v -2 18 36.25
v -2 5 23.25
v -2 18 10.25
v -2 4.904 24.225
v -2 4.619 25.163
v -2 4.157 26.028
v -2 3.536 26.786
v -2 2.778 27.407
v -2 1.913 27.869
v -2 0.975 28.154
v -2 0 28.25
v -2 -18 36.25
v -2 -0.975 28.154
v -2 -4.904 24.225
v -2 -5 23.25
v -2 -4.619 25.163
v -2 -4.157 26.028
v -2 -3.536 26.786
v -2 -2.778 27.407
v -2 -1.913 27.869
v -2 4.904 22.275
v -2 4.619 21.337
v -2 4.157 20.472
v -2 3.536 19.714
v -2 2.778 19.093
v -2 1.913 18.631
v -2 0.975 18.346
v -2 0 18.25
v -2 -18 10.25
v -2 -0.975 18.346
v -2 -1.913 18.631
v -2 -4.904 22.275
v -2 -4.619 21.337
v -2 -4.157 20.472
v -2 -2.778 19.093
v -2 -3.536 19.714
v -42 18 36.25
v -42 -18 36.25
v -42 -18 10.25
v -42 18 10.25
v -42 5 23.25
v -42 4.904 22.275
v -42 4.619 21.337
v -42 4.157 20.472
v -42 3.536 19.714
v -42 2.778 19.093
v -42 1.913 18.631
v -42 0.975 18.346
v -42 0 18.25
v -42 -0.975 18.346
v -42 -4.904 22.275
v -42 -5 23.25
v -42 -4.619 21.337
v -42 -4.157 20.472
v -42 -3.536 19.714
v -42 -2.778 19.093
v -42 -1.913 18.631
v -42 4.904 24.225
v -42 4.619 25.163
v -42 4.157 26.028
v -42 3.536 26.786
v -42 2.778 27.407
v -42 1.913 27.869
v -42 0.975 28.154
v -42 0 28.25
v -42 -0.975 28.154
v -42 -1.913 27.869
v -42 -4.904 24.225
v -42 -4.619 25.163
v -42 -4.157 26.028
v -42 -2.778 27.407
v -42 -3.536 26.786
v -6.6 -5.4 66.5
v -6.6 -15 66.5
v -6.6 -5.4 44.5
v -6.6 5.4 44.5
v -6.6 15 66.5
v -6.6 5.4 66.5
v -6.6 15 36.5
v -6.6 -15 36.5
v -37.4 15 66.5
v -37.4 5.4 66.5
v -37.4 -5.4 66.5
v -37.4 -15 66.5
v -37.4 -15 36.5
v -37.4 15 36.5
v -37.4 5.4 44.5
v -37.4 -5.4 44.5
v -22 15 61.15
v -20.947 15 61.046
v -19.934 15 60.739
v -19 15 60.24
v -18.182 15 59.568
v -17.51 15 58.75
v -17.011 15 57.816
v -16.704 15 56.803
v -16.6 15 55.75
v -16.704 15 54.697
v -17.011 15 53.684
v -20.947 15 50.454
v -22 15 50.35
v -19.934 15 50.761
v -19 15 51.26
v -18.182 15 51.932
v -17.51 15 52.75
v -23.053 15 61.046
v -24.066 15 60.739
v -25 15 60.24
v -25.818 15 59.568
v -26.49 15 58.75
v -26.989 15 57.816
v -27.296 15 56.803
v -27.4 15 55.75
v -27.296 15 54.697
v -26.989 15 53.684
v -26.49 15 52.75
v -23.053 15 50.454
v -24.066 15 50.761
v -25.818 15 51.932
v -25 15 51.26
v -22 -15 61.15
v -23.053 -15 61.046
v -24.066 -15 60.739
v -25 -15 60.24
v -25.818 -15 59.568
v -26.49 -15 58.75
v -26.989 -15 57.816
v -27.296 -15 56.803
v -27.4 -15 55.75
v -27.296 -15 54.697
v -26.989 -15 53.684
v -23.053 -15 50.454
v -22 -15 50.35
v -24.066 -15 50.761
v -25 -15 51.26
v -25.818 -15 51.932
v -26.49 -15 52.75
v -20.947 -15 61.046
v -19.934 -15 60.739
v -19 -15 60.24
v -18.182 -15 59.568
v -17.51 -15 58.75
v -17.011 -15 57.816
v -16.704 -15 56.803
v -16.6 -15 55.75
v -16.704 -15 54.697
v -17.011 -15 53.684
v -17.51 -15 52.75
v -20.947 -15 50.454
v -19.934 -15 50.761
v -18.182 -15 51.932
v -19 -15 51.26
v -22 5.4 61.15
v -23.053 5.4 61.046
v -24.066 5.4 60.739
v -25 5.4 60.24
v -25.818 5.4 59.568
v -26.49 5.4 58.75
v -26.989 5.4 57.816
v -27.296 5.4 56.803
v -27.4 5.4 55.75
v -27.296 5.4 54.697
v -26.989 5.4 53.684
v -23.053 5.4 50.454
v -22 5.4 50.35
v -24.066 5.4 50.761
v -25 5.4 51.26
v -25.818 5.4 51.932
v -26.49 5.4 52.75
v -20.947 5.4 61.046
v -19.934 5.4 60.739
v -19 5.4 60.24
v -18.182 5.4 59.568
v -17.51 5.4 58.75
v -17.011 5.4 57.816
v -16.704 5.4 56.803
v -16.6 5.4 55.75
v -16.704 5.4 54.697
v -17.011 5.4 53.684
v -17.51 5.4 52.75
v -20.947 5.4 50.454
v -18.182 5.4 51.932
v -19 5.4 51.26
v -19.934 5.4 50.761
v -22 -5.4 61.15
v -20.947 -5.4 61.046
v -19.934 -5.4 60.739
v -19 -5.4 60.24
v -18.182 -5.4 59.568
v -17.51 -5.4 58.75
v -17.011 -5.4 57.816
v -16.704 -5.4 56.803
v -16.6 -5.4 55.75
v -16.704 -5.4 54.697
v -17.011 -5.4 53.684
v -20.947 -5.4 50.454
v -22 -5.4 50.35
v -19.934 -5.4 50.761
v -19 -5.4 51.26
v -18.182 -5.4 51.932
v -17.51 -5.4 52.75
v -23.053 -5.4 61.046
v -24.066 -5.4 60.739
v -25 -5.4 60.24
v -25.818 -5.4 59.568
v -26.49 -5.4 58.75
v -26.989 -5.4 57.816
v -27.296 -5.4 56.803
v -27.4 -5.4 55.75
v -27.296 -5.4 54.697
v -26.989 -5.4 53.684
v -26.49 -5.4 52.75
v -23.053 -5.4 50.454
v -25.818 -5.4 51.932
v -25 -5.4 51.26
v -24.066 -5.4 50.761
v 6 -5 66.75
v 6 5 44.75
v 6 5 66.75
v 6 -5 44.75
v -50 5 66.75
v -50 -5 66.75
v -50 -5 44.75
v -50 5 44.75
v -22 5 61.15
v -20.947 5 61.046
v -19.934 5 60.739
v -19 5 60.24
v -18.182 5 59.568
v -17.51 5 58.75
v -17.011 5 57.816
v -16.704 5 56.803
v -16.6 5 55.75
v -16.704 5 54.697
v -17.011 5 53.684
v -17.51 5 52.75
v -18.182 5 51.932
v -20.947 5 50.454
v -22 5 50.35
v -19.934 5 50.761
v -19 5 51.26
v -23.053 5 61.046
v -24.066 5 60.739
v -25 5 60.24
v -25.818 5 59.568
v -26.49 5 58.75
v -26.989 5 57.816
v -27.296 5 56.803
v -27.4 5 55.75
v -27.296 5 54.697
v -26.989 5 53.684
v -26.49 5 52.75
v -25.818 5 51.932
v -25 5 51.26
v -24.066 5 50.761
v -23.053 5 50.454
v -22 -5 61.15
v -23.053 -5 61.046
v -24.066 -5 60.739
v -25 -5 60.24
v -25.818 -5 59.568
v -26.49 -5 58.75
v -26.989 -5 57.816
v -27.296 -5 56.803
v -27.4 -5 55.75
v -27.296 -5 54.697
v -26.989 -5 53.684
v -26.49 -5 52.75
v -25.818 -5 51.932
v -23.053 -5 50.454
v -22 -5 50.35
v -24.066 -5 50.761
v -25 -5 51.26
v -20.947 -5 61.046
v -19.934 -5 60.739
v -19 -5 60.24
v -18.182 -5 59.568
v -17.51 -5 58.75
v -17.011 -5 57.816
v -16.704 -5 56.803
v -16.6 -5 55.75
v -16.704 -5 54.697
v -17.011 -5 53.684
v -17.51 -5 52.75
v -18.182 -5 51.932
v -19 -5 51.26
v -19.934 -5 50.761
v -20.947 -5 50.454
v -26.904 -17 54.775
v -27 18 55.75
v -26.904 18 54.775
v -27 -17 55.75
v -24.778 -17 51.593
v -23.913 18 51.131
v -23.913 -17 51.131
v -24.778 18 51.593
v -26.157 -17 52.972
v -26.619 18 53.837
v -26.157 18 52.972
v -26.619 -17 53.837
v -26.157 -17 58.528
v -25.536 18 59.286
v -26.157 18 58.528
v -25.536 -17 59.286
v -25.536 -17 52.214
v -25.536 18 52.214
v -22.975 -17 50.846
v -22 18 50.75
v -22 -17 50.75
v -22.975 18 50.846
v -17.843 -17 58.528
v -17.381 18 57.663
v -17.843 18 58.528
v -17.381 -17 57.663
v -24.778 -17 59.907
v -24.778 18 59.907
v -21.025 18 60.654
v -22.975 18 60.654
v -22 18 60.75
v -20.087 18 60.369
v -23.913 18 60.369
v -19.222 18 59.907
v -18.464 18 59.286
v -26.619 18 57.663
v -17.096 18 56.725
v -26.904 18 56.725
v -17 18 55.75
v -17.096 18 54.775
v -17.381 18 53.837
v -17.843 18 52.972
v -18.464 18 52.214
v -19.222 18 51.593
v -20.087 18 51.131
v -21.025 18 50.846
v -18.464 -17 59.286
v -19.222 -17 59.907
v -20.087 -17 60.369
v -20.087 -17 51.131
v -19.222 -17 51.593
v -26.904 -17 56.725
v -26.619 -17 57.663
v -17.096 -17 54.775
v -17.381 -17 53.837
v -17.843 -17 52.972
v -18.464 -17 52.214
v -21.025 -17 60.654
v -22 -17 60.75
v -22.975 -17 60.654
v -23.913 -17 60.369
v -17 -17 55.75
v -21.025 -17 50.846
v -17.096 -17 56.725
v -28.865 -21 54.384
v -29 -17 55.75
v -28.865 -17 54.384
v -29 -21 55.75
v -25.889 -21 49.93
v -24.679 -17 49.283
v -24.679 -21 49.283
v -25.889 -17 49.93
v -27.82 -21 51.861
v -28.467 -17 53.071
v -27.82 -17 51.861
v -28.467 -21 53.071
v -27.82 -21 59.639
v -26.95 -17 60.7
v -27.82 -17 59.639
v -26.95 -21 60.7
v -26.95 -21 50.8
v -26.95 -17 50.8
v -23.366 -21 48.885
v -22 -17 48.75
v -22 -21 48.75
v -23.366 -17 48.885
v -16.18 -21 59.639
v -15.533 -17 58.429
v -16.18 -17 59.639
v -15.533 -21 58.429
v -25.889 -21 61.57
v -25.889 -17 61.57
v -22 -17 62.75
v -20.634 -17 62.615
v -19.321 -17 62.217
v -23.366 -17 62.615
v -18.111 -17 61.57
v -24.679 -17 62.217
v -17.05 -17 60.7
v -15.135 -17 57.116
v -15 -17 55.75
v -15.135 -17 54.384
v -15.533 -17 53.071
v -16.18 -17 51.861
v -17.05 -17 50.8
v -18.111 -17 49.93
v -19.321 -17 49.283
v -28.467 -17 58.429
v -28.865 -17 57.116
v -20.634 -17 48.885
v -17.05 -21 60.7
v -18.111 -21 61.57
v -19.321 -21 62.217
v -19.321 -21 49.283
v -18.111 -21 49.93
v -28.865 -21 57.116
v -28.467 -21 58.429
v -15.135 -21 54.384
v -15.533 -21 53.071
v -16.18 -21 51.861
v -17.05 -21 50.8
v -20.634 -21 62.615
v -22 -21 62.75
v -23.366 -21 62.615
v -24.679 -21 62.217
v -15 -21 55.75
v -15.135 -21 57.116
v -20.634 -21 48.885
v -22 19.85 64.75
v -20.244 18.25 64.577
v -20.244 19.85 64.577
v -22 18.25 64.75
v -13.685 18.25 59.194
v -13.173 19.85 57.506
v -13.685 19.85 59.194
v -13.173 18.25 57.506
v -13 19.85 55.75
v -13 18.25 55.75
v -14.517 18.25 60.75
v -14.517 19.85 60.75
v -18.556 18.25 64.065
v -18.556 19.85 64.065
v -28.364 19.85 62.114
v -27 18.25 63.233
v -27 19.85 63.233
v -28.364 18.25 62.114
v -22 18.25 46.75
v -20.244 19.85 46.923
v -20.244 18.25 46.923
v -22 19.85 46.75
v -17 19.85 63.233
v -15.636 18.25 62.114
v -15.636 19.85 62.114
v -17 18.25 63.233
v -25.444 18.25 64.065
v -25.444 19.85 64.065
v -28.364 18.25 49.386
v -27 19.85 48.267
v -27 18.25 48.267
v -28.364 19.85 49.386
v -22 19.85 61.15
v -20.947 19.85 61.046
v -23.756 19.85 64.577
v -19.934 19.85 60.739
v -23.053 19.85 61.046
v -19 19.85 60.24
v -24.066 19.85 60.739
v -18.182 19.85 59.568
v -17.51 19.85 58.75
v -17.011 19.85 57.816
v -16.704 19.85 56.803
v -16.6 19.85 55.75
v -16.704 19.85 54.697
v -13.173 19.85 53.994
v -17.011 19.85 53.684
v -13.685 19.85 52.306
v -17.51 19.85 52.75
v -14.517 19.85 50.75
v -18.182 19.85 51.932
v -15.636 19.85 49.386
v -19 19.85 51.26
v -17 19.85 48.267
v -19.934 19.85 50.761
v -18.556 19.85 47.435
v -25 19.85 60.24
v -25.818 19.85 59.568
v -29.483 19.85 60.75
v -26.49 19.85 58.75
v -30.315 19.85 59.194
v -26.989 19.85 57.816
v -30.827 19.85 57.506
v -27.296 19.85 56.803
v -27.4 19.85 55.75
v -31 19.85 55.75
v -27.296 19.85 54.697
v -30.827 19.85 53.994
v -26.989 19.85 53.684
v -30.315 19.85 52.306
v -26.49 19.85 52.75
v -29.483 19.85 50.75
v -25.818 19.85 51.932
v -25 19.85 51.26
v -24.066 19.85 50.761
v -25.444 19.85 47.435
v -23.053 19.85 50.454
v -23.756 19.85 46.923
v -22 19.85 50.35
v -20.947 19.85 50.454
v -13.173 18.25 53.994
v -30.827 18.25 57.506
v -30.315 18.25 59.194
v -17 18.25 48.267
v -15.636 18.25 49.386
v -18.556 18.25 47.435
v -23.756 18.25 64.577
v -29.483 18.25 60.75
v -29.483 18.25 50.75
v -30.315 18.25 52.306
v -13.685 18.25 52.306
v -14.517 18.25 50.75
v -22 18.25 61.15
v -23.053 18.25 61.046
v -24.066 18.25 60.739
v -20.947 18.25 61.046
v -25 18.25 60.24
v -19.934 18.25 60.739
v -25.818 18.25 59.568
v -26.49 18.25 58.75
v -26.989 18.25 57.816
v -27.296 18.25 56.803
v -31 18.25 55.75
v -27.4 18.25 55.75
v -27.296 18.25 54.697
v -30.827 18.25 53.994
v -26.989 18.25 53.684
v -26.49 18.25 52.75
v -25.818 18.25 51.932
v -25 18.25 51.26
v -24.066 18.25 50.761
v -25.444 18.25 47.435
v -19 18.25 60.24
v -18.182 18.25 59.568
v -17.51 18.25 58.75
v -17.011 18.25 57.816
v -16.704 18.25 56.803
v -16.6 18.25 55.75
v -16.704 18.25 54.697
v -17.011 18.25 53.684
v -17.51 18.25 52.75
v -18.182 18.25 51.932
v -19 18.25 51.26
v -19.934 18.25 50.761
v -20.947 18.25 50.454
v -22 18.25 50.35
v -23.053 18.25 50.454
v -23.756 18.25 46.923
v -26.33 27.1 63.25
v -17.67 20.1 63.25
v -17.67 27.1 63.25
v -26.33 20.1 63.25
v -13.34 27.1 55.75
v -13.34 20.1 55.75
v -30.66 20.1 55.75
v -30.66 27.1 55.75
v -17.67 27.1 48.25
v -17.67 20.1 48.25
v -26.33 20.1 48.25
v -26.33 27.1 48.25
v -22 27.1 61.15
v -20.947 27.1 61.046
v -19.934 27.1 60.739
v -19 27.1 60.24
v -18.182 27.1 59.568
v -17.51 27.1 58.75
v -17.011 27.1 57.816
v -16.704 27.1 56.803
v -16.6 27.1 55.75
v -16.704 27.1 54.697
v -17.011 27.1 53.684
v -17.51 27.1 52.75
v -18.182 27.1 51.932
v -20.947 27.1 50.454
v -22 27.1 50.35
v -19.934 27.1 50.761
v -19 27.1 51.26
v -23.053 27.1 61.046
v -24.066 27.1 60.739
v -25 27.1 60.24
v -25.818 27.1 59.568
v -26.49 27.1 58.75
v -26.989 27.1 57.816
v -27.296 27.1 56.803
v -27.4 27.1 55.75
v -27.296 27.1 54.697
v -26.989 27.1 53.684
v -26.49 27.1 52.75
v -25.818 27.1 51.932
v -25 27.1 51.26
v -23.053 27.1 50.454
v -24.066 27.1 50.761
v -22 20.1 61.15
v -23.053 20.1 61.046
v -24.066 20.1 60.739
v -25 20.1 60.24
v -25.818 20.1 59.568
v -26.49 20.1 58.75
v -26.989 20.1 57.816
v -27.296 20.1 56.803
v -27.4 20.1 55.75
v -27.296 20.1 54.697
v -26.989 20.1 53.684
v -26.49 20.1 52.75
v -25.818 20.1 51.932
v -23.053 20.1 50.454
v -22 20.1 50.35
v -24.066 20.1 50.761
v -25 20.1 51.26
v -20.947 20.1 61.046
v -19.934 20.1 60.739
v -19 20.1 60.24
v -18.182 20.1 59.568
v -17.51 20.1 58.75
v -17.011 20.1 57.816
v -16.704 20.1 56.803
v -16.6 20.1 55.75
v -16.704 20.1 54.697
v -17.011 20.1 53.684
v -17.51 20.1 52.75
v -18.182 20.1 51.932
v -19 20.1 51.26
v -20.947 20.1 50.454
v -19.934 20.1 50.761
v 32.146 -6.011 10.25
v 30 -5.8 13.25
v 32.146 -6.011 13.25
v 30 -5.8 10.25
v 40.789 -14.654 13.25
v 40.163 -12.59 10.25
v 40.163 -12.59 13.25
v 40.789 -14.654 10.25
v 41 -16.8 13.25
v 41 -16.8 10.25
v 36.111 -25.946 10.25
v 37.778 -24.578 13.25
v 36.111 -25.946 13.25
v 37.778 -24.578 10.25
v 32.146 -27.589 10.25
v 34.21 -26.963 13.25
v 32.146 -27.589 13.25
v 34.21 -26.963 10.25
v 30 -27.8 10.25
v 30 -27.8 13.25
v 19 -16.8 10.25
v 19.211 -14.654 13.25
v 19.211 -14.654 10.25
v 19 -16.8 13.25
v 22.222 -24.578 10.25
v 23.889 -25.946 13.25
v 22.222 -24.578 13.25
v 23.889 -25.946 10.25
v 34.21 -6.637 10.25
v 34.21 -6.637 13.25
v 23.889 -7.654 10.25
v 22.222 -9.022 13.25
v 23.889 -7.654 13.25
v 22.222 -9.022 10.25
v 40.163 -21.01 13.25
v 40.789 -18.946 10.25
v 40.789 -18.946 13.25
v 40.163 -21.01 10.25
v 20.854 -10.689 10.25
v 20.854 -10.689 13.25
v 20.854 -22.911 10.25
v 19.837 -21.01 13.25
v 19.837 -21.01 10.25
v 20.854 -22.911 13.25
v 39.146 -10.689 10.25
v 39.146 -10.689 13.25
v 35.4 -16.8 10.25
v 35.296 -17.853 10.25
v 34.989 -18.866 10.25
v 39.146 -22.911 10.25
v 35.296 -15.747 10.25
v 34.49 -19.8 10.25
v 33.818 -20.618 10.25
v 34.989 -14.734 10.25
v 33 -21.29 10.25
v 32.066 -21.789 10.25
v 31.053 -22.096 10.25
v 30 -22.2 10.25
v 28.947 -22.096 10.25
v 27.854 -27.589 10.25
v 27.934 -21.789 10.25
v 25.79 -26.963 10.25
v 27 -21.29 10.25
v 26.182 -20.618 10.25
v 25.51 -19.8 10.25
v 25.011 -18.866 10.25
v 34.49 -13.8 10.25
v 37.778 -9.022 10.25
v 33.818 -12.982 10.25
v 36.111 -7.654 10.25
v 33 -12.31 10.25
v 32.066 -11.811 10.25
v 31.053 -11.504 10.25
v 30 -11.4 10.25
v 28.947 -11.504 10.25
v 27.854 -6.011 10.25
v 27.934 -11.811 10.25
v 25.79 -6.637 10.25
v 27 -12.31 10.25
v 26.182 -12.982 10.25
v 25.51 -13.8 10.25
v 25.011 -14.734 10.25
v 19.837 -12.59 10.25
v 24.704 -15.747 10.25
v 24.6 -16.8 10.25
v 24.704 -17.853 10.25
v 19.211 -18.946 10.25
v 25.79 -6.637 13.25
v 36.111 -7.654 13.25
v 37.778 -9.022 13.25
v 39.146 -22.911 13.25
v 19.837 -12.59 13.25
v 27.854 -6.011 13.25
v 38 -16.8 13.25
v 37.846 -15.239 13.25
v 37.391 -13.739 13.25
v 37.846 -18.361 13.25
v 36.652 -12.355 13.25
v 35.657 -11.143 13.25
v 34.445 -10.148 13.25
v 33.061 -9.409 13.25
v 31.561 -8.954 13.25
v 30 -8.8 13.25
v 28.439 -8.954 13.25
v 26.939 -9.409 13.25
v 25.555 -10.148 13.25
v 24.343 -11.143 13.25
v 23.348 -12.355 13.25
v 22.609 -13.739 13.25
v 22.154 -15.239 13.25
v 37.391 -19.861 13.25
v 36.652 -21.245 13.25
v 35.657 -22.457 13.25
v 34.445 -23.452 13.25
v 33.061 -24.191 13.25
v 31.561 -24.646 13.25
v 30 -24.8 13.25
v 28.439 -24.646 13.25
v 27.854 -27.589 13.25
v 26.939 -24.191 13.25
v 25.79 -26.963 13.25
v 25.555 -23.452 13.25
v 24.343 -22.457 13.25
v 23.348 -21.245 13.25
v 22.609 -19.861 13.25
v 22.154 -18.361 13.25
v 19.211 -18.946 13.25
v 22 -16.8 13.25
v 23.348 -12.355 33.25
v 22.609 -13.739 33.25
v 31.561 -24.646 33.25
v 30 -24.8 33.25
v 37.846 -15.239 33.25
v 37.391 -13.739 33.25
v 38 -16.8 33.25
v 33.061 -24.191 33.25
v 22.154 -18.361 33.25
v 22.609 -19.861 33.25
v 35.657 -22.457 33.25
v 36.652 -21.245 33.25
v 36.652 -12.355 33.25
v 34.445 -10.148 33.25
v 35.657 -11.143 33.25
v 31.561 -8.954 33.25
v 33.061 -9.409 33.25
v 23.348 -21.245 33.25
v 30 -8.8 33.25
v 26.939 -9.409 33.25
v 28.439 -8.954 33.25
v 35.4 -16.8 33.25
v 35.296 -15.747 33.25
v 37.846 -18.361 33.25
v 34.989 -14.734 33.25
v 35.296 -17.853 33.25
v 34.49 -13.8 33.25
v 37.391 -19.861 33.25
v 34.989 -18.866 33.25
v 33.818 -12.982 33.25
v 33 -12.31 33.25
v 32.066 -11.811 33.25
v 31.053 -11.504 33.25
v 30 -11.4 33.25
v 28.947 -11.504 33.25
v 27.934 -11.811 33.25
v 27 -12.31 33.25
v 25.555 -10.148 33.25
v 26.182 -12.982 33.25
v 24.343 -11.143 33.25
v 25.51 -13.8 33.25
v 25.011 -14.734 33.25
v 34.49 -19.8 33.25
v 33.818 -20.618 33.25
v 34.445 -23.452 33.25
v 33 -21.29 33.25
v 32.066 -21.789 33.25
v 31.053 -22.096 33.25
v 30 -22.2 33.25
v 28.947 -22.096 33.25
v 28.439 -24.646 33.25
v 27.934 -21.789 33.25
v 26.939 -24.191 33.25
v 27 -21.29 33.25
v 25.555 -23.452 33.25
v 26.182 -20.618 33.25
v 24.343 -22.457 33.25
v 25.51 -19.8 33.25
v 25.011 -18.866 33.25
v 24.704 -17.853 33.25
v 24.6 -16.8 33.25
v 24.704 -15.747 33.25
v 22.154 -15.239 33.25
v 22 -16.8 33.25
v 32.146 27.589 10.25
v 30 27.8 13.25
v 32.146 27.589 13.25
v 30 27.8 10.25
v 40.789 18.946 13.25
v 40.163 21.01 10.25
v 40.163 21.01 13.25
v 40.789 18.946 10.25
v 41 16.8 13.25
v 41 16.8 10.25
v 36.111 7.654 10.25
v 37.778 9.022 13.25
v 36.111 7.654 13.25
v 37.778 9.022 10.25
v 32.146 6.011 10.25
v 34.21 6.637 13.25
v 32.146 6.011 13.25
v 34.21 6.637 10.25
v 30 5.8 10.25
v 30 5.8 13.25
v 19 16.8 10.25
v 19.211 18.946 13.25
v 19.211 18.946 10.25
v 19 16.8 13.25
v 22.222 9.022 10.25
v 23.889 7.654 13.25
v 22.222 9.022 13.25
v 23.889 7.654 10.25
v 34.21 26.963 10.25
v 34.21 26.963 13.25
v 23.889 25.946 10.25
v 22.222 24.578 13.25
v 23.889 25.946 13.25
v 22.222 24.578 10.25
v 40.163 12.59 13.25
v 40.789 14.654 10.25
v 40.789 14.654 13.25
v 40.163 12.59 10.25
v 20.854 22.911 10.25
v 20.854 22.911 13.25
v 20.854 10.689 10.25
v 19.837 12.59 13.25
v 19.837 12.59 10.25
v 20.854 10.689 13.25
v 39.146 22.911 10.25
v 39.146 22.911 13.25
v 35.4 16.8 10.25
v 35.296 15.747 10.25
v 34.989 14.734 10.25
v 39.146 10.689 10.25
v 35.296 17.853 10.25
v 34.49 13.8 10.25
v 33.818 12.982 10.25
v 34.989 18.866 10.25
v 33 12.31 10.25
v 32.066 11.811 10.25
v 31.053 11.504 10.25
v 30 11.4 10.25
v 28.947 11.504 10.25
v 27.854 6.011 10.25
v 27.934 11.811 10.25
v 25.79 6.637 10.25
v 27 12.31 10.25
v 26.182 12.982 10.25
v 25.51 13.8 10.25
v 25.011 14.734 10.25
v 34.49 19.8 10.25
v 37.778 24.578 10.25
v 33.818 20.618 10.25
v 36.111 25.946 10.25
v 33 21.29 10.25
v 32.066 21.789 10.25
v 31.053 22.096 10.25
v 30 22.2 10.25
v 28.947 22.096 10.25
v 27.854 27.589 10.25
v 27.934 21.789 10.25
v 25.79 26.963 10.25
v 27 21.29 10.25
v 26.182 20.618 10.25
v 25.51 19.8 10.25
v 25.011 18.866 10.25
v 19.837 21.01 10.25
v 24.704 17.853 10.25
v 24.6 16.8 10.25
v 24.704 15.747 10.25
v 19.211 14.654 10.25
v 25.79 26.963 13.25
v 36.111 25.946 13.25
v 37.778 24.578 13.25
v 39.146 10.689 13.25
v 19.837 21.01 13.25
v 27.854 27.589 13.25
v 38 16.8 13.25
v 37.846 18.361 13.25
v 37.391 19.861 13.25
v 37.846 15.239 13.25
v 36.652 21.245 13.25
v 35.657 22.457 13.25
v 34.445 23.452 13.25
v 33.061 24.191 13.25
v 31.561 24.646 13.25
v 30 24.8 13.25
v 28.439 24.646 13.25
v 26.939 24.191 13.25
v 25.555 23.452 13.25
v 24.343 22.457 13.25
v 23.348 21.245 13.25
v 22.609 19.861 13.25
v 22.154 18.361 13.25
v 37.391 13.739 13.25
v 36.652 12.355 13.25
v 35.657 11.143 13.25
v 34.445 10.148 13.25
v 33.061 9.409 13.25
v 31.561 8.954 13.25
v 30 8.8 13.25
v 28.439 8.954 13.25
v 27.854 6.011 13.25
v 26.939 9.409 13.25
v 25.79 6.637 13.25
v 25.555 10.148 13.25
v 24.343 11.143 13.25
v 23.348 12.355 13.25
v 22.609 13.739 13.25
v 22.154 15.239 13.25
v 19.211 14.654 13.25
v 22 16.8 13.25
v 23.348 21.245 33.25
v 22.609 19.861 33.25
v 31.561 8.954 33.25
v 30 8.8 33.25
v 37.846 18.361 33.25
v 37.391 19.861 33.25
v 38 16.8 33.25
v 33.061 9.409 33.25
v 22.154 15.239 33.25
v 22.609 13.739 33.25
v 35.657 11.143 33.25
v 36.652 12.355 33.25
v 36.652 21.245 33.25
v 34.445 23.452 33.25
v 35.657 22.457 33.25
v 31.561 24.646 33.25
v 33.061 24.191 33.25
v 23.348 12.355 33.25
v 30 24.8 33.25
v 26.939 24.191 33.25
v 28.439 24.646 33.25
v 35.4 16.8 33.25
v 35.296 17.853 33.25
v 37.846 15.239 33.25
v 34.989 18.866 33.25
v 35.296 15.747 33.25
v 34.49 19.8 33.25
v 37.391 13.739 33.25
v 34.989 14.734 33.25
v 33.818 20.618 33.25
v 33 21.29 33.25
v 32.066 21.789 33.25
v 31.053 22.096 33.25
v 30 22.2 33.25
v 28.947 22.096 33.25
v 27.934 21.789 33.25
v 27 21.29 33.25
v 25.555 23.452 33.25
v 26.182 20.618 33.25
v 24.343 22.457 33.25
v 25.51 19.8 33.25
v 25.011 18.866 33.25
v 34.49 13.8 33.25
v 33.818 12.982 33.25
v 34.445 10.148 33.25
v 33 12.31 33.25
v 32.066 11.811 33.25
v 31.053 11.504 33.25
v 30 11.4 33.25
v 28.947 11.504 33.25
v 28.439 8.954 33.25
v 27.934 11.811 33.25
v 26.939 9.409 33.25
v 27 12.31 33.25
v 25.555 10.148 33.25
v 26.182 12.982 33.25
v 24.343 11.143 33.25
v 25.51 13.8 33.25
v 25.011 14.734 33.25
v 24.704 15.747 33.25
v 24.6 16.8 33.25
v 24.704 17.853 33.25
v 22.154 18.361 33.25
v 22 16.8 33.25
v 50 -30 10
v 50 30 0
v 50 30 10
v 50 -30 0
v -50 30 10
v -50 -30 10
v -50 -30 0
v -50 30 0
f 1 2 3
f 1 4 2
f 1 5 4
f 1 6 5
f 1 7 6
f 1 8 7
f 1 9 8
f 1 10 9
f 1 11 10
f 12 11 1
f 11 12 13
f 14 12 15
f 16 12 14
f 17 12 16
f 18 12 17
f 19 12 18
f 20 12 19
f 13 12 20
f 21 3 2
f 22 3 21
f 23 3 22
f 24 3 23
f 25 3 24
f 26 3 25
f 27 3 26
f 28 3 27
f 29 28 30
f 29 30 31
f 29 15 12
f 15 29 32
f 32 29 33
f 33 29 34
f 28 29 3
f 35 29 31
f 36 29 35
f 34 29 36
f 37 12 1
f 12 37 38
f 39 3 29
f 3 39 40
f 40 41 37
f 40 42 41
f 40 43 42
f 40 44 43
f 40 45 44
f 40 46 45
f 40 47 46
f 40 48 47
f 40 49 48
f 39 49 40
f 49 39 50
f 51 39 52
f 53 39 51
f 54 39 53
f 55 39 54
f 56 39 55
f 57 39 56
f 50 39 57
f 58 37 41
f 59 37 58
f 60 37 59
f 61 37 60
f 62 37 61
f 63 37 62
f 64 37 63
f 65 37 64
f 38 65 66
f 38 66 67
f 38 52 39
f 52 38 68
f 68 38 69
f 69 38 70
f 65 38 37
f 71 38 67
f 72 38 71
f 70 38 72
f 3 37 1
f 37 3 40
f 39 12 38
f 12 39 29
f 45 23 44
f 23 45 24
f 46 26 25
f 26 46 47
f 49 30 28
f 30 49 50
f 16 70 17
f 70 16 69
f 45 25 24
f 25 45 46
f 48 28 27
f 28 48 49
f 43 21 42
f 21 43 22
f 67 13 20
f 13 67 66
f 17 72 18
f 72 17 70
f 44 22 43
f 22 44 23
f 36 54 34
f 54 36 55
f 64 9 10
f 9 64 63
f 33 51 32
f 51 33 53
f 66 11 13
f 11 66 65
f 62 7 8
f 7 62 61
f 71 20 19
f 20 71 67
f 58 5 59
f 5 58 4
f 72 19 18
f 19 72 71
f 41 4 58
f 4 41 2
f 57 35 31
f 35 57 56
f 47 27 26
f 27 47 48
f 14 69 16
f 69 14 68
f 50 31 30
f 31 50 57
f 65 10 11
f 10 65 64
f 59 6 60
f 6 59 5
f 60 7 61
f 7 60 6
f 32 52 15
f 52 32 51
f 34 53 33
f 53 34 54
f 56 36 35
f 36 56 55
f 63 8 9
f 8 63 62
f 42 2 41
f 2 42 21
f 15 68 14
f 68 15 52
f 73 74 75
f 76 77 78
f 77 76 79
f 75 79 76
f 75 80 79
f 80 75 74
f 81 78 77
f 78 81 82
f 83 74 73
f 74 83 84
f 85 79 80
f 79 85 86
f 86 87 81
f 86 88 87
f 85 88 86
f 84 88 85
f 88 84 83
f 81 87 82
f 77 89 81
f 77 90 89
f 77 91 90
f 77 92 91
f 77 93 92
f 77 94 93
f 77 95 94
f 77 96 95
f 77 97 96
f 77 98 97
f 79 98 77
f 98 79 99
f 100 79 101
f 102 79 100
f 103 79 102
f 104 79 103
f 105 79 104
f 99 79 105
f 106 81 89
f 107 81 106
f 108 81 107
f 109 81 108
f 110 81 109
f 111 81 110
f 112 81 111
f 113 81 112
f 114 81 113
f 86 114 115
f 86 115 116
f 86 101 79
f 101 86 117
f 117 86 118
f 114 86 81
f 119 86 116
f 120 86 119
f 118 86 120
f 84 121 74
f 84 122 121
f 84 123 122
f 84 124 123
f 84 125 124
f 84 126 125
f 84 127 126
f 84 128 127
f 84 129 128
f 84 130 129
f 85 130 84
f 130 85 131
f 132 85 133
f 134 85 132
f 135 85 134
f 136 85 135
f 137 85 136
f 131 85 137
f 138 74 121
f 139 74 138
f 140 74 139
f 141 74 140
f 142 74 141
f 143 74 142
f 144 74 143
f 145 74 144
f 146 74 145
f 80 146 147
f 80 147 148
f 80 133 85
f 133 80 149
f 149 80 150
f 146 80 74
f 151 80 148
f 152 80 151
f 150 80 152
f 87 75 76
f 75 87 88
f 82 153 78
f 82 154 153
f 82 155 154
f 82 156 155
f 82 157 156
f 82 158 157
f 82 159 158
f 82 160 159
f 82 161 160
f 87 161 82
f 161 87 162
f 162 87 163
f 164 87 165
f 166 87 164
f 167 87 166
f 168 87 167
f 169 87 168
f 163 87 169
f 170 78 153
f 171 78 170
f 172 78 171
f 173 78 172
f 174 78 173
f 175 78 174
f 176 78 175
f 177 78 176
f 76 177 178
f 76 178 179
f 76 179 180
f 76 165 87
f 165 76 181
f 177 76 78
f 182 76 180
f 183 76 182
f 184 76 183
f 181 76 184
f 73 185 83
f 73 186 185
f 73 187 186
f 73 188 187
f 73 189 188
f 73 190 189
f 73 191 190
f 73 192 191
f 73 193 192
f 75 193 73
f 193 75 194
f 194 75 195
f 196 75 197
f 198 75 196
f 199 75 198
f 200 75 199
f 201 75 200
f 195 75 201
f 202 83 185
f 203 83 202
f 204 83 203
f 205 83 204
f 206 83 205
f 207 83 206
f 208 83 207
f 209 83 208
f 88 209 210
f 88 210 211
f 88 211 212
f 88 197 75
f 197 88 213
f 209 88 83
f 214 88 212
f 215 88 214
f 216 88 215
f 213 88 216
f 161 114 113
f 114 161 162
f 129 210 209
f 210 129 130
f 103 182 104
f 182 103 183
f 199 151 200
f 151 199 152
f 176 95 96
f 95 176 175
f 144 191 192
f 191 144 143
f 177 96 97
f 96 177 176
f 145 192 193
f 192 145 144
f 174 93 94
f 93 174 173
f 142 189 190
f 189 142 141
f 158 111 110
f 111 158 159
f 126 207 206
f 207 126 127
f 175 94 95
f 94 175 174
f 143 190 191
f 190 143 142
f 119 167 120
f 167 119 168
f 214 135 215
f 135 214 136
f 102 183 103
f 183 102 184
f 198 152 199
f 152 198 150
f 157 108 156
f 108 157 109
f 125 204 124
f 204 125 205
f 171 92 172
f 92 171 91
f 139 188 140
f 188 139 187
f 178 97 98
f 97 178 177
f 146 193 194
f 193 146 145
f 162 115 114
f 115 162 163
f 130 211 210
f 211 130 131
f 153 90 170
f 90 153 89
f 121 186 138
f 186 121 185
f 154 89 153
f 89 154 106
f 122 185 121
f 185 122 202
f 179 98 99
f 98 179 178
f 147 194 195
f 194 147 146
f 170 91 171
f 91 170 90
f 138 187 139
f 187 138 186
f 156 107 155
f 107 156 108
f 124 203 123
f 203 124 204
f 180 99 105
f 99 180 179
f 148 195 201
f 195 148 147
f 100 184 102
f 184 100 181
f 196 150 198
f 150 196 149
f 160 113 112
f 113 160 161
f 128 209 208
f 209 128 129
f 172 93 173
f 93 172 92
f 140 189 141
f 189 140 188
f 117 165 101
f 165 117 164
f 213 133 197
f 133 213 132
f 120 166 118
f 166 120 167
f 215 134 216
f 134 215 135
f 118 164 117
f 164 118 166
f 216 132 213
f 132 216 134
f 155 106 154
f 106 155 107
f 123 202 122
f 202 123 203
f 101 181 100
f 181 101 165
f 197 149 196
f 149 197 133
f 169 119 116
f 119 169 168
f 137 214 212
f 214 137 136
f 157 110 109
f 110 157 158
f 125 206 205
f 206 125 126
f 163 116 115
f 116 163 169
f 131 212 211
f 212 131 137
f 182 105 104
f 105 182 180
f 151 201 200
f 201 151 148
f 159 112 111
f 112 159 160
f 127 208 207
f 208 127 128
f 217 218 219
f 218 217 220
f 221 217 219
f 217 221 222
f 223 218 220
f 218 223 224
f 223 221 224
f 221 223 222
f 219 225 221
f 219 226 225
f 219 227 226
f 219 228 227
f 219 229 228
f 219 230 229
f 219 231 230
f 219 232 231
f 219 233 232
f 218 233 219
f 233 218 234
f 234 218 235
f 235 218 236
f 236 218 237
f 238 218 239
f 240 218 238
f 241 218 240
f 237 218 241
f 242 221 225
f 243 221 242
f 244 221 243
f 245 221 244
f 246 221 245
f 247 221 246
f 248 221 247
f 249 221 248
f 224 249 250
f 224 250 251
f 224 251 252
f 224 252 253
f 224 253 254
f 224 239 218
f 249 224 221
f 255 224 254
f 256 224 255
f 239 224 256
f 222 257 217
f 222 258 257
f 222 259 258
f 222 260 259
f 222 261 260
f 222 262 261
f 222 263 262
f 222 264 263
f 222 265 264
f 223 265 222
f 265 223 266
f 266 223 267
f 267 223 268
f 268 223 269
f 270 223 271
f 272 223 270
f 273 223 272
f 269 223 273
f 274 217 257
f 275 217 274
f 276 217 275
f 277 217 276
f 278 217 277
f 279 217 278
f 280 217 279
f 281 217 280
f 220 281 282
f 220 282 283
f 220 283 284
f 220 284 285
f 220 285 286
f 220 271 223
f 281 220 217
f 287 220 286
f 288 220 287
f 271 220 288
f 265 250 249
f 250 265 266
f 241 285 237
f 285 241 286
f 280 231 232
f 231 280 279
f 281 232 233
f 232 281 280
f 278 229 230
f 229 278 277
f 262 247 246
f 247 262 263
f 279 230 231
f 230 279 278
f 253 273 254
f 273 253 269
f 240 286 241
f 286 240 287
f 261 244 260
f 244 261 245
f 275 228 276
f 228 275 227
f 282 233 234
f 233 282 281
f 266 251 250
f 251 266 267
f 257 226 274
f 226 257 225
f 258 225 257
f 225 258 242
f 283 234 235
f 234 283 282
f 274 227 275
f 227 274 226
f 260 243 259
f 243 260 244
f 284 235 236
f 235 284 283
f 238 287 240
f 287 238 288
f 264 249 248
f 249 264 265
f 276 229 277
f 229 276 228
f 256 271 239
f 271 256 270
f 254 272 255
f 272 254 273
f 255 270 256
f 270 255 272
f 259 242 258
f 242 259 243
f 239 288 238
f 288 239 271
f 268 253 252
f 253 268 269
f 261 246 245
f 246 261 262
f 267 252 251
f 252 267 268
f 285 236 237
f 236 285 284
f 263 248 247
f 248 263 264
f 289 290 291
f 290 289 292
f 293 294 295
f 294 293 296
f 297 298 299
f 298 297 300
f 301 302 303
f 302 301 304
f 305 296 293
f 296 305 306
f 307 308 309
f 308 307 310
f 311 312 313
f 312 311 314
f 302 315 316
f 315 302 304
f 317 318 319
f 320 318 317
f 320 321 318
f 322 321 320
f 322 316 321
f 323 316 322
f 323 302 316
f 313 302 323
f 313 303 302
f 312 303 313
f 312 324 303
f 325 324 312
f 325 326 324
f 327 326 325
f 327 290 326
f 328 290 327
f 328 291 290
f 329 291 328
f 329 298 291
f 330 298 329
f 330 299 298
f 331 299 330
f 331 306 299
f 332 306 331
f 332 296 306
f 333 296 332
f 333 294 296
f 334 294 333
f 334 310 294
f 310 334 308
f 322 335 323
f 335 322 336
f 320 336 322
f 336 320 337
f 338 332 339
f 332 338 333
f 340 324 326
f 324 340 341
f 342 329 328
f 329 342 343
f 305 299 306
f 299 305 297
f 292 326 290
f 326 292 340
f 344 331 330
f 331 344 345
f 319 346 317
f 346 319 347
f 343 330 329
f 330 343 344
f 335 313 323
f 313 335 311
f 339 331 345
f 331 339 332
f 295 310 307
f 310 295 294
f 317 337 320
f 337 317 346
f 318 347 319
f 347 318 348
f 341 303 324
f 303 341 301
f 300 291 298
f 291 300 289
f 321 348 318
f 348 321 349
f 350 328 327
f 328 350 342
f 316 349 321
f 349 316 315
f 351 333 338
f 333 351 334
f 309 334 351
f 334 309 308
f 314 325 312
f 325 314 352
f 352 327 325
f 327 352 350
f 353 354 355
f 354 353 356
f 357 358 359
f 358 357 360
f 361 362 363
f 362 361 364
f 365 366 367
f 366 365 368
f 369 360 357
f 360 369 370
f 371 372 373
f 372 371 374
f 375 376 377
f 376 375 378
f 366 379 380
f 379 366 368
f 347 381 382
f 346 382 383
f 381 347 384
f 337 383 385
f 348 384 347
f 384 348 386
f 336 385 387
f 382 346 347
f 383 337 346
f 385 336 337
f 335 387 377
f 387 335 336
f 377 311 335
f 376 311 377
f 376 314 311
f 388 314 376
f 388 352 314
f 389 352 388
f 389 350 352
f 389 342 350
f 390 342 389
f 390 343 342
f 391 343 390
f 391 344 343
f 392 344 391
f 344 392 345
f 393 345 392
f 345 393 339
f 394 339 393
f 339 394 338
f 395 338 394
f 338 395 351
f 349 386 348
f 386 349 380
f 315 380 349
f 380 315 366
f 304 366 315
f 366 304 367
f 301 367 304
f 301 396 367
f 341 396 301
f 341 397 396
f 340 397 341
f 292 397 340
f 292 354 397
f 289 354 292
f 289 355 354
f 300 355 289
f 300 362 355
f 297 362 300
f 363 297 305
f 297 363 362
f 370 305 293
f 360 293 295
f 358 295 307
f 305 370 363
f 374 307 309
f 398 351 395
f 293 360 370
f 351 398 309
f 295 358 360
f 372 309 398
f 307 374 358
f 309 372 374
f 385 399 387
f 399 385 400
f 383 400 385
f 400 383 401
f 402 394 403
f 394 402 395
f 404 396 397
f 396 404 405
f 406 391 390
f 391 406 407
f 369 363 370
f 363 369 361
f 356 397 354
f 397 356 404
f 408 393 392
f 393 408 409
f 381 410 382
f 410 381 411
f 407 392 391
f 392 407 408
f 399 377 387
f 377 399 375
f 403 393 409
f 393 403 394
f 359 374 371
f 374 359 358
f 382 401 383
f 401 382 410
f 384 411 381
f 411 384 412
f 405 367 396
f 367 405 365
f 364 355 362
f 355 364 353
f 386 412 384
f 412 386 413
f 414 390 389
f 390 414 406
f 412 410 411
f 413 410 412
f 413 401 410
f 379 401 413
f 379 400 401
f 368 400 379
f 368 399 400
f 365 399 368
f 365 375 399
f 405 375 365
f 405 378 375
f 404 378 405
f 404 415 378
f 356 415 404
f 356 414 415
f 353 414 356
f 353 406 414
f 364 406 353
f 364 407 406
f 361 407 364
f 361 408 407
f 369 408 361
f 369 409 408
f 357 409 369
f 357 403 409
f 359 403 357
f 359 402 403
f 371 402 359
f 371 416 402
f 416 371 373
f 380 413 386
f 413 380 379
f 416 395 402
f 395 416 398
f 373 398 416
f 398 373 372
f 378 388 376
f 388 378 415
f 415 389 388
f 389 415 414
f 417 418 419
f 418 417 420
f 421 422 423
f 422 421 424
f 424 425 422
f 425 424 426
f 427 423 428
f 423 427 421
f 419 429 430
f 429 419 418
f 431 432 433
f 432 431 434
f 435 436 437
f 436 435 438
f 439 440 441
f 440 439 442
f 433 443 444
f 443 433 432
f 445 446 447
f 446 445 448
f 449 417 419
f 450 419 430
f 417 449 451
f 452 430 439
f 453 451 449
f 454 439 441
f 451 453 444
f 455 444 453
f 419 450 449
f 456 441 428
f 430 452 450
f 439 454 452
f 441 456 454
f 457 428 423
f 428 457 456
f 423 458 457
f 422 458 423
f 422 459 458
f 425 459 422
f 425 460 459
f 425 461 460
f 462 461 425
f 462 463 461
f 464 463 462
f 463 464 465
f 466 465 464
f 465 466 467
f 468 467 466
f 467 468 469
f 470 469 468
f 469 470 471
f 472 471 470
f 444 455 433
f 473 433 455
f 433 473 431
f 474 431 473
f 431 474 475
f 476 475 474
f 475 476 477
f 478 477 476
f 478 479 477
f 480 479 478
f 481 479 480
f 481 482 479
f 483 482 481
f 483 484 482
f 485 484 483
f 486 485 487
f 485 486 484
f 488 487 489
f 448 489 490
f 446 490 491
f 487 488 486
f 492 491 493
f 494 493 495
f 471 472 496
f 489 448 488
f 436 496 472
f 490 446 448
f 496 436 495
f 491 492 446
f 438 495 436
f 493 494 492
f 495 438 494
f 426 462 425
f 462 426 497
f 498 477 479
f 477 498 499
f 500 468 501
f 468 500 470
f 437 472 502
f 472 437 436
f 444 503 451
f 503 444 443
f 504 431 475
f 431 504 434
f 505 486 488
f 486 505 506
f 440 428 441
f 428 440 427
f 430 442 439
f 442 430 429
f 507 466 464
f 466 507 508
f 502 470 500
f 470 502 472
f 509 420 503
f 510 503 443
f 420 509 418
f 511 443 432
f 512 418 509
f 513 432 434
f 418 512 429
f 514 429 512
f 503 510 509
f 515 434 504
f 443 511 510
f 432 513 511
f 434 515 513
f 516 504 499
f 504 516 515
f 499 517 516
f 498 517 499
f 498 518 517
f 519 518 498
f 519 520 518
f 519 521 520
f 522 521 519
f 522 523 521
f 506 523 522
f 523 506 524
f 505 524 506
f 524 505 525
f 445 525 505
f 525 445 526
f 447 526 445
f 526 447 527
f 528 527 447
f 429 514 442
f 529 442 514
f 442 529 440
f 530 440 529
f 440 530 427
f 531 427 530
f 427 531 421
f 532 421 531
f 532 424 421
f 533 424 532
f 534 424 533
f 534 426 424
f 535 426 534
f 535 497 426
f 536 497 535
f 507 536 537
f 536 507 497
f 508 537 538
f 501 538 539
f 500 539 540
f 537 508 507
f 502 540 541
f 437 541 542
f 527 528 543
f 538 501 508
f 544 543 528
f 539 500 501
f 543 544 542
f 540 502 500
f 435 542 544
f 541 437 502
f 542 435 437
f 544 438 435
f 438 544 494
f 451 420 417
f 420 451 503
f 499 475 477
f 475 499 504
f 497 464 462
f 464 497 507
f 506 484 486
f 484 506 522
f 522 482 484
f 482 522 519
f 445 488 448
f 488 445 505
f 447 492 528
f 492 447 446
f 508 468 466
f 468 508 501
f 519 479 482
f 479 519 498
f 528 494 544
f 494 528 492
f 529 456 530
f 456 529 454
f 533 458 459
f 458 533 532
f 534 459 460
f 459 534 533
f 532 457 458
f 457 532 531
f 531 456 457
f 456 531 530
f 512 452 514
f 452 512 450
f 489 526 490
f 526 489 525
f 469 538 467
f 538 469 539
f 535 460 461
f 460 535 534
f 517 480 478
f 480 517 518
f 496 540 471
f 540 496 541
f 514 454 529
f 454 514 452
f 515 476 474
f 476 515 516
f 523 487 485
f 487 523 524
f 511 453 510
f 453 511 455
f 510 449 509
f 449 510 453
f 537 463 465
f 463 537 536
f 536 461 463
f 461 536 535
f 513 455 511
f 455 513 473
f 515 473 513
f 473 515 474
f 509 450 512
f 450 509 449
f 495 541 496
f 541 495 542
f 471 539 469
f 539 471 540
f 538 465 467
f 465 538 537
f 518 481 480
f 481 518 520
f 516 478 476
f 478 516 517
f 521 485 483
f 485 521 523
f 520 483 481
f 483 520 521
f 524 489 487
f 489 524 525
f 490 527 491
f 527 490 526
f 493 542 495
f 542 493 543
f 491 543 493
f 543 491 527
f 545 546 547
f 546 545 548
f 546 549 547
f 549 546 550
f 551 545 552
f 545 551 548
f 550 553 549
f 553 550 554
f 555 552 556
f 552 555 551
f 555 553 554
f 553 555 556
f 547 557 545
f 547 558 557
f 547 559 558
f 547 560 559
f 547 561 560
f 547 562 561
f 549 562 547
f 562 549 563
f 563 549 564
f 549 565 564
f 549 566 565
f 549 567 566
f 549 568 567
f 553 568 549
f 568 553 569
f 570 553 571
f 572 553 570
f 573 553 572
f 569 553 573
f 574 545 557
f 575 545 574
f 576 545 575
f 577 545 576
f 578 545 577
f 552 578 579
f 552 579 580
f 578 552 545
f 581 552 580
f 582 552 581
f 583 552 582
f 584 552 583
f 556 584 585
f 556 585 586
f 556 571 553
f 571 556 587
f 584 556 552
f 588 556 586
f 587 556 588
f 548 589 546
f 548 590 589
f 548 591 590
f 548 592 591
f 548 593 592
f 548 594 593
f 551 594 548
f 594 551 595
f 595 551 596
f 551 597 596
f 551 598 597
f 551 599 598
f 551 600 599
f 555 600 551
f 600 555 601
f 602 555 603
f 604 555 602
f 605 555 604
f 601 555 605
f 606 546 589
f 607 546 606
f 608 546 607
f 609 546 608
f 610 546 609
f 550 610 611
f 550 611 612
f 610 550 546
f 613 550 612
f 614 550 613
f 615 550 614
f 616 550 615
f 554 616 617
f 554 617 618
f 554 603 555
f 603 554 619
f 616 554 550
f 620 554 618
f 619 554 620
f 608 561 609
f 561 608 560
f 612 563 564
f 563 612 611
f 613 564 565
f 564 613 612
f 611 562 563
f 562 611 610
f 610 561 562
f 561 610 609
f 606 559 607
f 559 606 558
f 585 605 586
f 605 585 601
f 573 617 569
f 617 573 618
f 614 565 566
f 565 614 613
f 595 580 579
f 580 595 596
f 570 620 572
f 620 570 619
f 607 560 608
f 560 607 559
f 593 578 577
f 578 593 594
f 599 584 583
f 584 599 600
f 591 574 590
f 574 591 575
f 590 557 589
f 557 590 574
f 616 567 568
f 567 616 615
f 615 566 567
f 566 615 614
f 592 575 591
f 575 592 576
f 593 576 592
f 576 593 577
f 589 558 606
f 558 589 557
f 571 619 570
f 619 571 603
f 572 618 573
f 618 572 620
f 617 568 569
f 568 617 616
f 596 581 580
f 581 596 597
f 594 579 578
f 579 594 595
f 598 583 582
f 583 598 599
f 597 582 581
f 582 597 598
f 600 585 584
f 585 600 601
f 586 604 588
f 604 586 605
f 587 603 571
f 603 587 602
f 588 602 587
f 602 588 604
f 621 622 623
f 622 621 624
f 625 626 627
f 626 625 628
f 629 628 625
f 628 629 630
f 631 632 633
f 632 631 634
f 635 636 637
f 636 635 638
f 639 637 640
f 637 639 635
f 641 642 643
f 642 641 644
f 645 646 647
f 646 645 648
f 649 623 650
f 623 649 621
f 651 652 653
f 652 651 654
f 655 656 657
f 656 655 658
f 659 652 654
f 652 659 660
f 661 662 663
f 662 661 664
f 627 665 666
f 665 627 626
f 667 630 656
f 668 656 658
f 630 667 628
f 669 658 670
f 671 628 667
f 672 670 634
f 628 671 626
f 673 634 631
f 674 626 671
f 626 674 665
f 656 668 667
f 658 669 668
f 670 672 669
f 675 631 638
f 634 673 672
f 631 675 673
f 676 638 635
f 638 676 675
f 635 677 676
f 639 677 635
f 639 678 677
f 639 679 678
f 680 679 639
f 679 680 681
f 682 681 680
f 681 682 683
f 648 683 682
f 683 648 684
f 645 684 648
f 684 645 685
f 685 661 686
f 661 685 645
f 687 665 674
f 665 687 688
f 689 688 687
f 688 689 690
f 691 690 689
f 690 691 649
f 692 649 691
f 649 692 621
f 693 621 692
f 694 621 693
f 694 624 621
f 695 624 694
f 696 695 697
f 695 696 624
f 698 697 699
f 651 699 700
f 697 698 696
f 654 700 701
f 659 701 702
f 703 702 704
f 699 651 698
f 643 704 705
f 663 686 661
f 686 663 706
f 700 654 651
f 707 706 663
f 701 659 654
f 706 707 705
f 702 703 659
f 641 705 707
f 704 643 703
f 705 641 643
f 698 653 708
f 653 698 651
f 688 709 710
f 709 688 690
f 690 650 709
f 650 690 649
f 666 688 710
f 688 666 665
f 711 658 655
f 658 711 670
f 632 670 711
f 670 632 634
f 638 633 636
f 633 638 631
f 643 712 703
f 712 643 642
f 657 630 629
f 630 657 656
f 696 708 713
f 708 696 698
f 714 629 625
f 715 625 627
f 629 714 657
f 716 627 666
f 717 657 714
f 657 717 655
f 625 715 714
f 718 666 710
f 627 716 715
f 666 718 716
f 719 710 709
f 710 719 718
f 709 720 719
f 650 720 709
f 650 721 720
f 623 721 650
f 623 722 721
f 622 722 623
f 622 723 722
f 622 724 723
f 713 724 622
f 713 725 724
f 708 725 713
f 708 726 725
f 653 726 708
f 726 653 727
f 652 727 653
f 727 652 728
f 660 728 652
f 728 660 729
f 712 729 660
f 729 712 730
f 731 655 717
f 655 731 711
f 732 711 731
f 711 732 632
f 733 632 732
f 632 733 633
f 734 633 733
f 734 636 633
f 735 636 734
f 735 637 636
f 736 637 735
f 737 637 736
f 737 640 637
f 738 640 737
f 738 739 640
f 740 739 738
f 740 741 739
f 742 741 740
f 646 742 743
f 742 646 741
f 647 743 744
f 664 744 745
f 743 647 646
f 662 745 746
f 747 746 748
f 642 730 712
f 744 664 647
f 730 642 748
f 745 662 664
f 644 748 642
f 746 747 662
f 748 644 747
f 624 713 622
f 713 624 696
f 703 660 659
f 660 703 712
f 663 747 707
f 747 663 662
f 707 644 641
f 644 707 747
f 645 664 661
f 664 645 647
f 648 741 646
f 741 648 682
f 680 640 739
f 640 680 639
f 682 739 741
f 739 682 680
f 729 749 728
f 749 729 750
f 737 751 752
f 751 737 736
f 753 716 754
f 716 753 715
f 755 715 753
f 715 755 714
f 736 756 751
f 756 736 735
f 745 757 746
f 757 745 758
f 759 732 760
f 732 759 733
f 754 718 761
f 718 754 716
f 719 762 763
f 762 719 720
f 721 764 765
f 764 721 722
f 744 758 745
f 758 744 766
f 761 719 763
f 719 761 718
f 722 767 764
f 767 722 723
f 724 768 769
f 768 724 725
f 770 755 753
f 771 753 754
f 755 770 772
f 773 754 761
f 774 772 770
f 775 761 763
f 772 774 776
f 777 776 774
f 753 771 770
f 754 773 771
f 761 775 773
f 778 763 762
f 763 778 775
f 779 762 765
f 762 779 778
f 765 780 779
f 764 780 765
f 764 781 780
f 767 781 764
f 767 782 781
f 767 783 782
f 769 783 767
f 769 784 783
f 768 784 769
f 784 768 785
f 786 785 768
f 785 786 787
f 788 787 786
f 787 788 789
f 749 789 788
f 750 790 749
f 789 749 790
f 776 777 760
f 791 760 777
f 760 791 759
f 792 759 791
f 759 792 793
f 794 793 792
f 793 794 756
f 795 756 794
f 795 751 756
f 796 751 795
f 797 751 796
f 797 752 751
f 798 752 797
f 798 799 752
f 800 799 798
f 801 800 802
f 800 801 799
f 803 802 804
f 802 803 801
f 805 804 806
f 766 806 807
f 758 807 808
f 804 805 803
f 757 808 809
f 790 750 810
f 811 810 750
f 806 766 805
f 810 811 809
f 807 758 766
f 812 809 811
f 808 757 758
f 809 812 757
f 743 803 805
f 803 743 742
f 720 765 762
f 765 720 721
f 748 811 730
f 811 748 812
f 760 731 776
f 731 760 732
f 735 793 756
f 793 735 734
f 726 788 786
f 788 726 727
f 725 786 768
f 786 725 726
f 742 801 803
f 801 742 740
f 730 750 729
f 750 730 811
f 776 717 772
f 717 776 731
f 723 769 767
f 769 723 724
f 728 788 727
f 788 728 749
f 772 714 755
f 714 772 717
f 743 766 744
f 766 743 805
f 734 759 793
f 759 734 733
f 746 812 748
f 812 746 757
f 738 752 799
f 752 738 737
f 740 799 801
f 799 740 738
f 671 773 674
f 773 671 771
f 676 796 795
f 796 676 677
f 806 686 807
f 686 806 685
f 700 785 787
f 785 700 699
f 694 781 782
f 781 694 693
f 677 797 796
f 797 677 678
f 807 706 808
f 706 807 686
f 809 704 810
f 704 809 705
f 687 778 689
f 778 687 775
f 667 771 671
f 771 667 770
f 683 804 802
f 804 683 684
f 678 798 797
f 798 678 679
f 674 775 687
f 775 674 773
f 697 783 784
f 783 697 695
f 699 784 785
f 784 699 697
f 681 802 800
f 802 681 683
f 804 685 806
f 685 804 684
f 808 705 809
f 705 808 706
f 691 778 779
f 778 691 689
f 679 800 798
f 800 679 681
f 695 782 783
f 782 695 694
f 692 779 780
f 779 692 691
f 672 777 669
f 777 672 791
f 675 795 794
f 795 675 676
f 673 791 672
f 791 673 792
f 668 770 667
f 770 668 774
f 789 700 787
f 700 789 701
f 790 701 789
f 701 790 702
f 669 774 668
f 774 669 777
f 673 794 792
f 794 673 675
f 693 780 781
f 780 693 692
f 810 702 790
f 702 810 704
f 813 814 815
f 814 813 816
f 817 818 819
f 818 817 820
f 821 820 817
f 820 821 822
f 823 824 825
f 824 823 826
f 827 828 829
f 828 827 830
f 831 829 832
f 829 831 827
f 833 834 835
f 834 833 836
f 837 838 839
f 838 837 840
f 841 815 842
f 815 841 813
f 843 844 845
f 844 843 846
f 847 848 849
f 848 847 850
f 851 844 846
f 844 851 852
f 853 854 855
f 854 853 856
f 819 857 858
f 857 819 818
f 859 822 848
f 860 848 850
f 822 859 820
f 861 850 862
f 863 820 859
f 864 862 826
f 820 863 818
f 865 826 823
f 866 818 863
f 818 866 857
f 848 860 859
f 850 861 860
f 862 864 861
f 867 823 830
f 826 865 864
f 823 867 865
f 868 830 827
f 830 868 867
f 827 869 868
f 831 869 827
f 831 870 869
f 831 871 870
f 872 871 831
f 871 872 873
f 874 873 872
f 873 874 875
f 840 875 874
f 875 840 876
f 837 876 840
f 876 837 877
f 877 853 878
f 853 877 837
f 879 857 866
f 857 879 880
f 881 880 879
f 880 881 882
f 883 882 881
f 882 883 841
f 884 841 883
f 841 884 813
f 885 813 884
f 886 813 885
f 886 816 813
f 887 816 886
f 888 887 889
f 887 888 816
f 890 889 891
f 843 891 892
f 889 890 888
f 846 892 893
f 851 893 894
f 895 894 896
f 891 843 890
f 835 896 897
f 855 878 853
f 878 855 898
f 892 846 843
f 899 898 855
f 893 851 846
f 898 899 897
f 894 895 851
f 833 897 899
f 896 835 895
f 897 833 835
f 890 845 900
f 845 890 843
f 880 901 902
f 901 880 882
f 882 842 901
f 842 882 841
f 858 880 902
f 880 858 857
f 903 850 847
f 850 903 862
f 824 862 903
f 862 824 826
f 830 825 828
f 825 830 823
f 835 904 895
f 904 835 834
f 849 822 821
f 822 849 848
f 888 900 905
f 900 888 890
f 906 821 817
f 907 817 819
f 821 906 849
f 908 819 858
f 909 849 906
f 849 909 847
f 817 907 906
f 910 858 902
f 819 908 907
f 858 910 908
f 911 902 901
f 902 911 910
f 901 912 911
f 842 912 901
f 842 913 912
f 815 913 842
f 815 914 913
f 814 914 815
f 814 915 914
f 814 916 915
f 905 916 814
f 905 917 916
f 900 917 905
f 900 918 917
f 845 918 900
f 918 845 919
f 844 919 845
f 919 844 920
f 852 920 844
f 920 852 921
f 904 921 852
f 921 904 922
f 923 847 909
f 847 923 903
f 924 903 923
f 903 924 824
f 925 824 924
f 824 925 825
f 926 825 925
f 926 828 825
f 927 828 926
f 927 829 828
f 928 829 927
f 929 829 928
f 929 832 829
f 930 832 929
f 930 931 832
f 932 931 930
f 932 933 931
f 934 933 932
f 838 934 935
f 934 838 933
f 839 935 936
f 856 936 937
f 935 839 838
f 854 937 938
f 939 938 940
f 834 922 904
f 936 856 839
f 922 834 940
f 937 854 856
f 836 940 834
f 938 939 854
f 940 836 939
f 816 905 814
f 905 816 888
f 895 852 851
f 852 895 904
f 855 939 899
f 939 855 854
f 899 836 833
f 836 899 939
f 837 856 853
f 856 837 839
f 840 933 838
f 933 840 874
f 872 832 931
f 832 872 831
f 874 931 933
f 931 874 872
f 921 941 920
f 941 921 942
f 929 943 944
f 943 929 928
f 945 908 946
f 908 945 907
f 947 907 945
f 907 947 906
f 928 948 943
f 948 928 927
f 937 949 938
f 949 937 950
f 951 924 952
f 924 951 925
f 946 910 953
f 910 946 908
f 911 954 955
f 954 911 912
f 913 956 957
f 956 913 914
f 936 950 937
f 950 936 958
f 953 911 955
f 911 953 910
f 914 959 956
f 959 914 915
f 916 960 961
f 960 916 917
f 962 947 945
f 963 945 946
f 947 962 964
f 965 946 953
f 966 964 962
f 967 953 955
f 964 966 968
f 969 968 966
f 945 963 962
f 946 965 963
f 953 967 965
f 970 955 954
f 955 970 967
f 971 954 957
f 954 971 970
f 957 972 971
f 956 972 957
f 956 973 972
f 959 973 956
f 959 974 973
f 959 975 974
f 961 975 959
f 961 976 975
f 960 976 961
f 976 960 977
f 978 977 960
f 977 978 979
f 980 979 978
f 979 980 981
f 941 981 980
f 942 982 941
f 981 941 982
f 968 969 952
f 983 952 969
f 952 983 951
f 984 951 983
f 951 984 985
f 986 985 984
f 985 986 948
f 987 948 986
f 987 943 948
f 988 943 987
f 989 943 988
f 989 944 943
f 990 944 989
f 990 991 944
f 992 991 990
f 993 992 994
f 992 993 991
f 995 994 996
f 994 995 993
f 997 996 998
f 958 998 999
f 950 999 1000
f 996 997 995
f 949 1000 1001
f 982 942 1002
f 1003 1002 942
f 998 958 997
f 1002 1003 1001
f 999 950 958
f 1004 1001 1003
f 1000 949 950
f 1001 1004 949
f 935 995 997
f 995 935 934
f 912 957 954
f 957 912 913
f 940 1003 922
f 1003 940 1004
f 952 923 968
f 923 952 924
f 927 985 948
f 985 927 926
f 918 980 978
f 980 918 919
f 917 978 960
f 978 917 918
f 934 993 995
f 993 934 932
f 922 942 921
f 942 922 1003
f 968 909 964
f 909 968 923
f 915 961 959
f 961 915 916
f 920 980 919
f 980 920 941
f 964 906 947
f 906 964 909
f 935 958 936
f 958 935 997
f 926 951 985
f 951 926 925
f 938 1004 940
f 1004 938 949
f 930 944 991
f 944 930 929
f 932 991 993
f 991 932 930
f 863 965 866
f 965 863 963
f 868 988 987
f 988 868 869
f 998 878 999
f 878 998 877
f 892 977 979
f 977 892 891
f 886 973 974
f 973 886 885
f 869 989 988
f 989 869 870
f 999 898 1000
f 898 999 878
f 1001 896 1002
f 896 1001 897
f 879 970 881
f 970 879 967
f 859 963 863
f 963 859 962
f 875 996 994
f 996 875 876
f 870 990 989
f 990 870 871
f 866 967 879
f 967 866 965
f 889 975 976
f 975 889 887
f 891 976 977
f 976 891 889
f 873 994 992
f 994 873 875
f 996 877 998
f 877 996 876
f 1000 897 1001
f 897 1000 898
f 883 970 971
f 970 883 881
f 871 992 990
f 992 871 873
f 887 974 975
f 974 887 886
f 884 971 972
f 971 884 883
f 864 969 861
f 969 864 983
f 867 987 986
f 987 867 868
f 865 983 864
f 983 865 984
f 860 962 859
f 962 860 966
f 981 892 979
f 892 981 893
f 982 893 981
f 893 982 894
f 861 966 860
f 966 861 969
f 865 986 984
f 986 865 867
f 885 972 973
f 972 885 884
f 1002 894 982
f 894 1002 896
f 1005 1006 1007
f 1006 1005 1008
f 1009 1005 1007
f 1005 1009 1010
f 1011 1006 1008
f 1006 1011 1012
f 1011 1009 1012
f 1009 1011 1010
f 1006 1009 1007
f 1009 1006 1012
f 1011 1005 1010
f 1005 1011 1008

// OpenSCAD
$fn = 32;

// ------------------------------------------------------------------------
// Indexing jig: plate 100 x 60 mm, pin d10
// Every part is its own module, assembly() places every instance.
// ------------------------------------------------------------------------

// --- part 1 ---
module jig_plate() {
  difference() {
    translate([-50, -30, 0]) cube([100, 60, 10]);
  }
}

// --- part 2 ---
module locator_block() {
  difference() {
    translate([-20, -18, 0]) cube([40, 36, 26]);
    translate([0, 0, 13]) rotate([0, 90, 0]) cylinder(h = 42, d = 10, center = true);
  }
}

// --- part 3 ---
module index_fork() {
  difference() {
    translate([-15.4, -15, 0]) cube([30.8, 30, 30]);
    translate([-16.4, -5.4, 8]) cube([32.8, 10.8, 23]);
    translate([0, 0, 19.25]) rotate([90, 0, 0]) cylinder(h = 32, d = 10.8, center = true);
  }
}

// --- part 4 ---
module index_arm() {
  difference() {
    translate([-28, -5, 0]) cube([56, 10, 22]);
    translate([0, 0, 11]) rotate([90, 0, 0]) cylinder(h = 12, d = 10.8, center = true);
  }
}

// --- part 5 ---
module index_pin() {
  rotate([0, 90, 0]) cylinder(h = 36, d = 10, center = true);
  translate([-21, 0, 0]) rotate([0, 90, 0]) cylinder(h = 4, d = 14);
}

// --- part 6 ---
module pin_washer() {
  difference() {
      translate([0, 0, 0]) cylinder(h = 1.6, d = 18);
      translate([0, 0, -1]) cylinder(h = 3.6, d = 10.8);
    }
}

// --- part 7 ---
module lock_nut() {
  difference() {
    linear_extrude(height = 7) polygon(points = [[8.66, 0], [4.33, 7.5], [-4.33, 7.5], [-8.66, 0], [-4.33, -7.5], [4.33, -7.5]]);
    translate([0, 0, -1]) cylinder(h = 9, d = 10.8);
  }
}

// --- part 8 ---
module guide_bush_a() {
  difference() {
    union() {
      cylinder(h = 3, d = 22);
      translate([0, 0, 3]) cylinder(h = 20, d = 16);
    }
    translate([0, 0, -1]) cylinder(h = 25, d = 10.8);
  }
}

// --- part 9 ---
module guide_bush_b() {
  difference() {
    union() {
      cylinder(h = 3, d = 22);
      translate([0, 0, 3]) cylinder(h = 20, d = 16);
    }
    translate([0, 0, -1]) cylinder(h = 25, d = 10.8);
  }
}

// --- assembly ---
module assembly() {
  color([0.80, 0.24, 0.20]) translate([0, 0, 0]) rotate([0, 0, 0]) jig_plate();
  color([0.20, 0.45, 0.75]) translate([-22, 0, 10.25]) rotate([0, 0, 0]) locator_block();
  color([0.25, 0.62, 0.32]) translate([-22, 0, 36.5]) rotate([0, 0, 0]) index_fork();
  color([0.92, 0.70, 0.18]) translate([-22, 0, 44.75]) rotate([0, 0, 0]) index_arm();
  color([0.58, 0.35, 0.70]) translate([-22, 0, 55.75]) rotate([0, 0, 90]) index_pin();
  color([0.16, 0.66, 0.66]) translate([-22, 19.85, 55.75]) rotate([90, 0, 0]) pin_washer();
  color([0.85, 0.48, 0.18]) translate([-22, 27.1, 55.75]) rotate([90, 0, 0]) lock_nut();
  color([0.55, 0.60, 0.65]) translate([30, -16.8, 10.25]) rotate([0, 0, 0]) guide_bush_a();
  color([0.75, 0.30, 0.55]) translate([30, 16.8, 10.25]) rotate([0, 0, 0]) guide_bush_b();
}

assembly();
